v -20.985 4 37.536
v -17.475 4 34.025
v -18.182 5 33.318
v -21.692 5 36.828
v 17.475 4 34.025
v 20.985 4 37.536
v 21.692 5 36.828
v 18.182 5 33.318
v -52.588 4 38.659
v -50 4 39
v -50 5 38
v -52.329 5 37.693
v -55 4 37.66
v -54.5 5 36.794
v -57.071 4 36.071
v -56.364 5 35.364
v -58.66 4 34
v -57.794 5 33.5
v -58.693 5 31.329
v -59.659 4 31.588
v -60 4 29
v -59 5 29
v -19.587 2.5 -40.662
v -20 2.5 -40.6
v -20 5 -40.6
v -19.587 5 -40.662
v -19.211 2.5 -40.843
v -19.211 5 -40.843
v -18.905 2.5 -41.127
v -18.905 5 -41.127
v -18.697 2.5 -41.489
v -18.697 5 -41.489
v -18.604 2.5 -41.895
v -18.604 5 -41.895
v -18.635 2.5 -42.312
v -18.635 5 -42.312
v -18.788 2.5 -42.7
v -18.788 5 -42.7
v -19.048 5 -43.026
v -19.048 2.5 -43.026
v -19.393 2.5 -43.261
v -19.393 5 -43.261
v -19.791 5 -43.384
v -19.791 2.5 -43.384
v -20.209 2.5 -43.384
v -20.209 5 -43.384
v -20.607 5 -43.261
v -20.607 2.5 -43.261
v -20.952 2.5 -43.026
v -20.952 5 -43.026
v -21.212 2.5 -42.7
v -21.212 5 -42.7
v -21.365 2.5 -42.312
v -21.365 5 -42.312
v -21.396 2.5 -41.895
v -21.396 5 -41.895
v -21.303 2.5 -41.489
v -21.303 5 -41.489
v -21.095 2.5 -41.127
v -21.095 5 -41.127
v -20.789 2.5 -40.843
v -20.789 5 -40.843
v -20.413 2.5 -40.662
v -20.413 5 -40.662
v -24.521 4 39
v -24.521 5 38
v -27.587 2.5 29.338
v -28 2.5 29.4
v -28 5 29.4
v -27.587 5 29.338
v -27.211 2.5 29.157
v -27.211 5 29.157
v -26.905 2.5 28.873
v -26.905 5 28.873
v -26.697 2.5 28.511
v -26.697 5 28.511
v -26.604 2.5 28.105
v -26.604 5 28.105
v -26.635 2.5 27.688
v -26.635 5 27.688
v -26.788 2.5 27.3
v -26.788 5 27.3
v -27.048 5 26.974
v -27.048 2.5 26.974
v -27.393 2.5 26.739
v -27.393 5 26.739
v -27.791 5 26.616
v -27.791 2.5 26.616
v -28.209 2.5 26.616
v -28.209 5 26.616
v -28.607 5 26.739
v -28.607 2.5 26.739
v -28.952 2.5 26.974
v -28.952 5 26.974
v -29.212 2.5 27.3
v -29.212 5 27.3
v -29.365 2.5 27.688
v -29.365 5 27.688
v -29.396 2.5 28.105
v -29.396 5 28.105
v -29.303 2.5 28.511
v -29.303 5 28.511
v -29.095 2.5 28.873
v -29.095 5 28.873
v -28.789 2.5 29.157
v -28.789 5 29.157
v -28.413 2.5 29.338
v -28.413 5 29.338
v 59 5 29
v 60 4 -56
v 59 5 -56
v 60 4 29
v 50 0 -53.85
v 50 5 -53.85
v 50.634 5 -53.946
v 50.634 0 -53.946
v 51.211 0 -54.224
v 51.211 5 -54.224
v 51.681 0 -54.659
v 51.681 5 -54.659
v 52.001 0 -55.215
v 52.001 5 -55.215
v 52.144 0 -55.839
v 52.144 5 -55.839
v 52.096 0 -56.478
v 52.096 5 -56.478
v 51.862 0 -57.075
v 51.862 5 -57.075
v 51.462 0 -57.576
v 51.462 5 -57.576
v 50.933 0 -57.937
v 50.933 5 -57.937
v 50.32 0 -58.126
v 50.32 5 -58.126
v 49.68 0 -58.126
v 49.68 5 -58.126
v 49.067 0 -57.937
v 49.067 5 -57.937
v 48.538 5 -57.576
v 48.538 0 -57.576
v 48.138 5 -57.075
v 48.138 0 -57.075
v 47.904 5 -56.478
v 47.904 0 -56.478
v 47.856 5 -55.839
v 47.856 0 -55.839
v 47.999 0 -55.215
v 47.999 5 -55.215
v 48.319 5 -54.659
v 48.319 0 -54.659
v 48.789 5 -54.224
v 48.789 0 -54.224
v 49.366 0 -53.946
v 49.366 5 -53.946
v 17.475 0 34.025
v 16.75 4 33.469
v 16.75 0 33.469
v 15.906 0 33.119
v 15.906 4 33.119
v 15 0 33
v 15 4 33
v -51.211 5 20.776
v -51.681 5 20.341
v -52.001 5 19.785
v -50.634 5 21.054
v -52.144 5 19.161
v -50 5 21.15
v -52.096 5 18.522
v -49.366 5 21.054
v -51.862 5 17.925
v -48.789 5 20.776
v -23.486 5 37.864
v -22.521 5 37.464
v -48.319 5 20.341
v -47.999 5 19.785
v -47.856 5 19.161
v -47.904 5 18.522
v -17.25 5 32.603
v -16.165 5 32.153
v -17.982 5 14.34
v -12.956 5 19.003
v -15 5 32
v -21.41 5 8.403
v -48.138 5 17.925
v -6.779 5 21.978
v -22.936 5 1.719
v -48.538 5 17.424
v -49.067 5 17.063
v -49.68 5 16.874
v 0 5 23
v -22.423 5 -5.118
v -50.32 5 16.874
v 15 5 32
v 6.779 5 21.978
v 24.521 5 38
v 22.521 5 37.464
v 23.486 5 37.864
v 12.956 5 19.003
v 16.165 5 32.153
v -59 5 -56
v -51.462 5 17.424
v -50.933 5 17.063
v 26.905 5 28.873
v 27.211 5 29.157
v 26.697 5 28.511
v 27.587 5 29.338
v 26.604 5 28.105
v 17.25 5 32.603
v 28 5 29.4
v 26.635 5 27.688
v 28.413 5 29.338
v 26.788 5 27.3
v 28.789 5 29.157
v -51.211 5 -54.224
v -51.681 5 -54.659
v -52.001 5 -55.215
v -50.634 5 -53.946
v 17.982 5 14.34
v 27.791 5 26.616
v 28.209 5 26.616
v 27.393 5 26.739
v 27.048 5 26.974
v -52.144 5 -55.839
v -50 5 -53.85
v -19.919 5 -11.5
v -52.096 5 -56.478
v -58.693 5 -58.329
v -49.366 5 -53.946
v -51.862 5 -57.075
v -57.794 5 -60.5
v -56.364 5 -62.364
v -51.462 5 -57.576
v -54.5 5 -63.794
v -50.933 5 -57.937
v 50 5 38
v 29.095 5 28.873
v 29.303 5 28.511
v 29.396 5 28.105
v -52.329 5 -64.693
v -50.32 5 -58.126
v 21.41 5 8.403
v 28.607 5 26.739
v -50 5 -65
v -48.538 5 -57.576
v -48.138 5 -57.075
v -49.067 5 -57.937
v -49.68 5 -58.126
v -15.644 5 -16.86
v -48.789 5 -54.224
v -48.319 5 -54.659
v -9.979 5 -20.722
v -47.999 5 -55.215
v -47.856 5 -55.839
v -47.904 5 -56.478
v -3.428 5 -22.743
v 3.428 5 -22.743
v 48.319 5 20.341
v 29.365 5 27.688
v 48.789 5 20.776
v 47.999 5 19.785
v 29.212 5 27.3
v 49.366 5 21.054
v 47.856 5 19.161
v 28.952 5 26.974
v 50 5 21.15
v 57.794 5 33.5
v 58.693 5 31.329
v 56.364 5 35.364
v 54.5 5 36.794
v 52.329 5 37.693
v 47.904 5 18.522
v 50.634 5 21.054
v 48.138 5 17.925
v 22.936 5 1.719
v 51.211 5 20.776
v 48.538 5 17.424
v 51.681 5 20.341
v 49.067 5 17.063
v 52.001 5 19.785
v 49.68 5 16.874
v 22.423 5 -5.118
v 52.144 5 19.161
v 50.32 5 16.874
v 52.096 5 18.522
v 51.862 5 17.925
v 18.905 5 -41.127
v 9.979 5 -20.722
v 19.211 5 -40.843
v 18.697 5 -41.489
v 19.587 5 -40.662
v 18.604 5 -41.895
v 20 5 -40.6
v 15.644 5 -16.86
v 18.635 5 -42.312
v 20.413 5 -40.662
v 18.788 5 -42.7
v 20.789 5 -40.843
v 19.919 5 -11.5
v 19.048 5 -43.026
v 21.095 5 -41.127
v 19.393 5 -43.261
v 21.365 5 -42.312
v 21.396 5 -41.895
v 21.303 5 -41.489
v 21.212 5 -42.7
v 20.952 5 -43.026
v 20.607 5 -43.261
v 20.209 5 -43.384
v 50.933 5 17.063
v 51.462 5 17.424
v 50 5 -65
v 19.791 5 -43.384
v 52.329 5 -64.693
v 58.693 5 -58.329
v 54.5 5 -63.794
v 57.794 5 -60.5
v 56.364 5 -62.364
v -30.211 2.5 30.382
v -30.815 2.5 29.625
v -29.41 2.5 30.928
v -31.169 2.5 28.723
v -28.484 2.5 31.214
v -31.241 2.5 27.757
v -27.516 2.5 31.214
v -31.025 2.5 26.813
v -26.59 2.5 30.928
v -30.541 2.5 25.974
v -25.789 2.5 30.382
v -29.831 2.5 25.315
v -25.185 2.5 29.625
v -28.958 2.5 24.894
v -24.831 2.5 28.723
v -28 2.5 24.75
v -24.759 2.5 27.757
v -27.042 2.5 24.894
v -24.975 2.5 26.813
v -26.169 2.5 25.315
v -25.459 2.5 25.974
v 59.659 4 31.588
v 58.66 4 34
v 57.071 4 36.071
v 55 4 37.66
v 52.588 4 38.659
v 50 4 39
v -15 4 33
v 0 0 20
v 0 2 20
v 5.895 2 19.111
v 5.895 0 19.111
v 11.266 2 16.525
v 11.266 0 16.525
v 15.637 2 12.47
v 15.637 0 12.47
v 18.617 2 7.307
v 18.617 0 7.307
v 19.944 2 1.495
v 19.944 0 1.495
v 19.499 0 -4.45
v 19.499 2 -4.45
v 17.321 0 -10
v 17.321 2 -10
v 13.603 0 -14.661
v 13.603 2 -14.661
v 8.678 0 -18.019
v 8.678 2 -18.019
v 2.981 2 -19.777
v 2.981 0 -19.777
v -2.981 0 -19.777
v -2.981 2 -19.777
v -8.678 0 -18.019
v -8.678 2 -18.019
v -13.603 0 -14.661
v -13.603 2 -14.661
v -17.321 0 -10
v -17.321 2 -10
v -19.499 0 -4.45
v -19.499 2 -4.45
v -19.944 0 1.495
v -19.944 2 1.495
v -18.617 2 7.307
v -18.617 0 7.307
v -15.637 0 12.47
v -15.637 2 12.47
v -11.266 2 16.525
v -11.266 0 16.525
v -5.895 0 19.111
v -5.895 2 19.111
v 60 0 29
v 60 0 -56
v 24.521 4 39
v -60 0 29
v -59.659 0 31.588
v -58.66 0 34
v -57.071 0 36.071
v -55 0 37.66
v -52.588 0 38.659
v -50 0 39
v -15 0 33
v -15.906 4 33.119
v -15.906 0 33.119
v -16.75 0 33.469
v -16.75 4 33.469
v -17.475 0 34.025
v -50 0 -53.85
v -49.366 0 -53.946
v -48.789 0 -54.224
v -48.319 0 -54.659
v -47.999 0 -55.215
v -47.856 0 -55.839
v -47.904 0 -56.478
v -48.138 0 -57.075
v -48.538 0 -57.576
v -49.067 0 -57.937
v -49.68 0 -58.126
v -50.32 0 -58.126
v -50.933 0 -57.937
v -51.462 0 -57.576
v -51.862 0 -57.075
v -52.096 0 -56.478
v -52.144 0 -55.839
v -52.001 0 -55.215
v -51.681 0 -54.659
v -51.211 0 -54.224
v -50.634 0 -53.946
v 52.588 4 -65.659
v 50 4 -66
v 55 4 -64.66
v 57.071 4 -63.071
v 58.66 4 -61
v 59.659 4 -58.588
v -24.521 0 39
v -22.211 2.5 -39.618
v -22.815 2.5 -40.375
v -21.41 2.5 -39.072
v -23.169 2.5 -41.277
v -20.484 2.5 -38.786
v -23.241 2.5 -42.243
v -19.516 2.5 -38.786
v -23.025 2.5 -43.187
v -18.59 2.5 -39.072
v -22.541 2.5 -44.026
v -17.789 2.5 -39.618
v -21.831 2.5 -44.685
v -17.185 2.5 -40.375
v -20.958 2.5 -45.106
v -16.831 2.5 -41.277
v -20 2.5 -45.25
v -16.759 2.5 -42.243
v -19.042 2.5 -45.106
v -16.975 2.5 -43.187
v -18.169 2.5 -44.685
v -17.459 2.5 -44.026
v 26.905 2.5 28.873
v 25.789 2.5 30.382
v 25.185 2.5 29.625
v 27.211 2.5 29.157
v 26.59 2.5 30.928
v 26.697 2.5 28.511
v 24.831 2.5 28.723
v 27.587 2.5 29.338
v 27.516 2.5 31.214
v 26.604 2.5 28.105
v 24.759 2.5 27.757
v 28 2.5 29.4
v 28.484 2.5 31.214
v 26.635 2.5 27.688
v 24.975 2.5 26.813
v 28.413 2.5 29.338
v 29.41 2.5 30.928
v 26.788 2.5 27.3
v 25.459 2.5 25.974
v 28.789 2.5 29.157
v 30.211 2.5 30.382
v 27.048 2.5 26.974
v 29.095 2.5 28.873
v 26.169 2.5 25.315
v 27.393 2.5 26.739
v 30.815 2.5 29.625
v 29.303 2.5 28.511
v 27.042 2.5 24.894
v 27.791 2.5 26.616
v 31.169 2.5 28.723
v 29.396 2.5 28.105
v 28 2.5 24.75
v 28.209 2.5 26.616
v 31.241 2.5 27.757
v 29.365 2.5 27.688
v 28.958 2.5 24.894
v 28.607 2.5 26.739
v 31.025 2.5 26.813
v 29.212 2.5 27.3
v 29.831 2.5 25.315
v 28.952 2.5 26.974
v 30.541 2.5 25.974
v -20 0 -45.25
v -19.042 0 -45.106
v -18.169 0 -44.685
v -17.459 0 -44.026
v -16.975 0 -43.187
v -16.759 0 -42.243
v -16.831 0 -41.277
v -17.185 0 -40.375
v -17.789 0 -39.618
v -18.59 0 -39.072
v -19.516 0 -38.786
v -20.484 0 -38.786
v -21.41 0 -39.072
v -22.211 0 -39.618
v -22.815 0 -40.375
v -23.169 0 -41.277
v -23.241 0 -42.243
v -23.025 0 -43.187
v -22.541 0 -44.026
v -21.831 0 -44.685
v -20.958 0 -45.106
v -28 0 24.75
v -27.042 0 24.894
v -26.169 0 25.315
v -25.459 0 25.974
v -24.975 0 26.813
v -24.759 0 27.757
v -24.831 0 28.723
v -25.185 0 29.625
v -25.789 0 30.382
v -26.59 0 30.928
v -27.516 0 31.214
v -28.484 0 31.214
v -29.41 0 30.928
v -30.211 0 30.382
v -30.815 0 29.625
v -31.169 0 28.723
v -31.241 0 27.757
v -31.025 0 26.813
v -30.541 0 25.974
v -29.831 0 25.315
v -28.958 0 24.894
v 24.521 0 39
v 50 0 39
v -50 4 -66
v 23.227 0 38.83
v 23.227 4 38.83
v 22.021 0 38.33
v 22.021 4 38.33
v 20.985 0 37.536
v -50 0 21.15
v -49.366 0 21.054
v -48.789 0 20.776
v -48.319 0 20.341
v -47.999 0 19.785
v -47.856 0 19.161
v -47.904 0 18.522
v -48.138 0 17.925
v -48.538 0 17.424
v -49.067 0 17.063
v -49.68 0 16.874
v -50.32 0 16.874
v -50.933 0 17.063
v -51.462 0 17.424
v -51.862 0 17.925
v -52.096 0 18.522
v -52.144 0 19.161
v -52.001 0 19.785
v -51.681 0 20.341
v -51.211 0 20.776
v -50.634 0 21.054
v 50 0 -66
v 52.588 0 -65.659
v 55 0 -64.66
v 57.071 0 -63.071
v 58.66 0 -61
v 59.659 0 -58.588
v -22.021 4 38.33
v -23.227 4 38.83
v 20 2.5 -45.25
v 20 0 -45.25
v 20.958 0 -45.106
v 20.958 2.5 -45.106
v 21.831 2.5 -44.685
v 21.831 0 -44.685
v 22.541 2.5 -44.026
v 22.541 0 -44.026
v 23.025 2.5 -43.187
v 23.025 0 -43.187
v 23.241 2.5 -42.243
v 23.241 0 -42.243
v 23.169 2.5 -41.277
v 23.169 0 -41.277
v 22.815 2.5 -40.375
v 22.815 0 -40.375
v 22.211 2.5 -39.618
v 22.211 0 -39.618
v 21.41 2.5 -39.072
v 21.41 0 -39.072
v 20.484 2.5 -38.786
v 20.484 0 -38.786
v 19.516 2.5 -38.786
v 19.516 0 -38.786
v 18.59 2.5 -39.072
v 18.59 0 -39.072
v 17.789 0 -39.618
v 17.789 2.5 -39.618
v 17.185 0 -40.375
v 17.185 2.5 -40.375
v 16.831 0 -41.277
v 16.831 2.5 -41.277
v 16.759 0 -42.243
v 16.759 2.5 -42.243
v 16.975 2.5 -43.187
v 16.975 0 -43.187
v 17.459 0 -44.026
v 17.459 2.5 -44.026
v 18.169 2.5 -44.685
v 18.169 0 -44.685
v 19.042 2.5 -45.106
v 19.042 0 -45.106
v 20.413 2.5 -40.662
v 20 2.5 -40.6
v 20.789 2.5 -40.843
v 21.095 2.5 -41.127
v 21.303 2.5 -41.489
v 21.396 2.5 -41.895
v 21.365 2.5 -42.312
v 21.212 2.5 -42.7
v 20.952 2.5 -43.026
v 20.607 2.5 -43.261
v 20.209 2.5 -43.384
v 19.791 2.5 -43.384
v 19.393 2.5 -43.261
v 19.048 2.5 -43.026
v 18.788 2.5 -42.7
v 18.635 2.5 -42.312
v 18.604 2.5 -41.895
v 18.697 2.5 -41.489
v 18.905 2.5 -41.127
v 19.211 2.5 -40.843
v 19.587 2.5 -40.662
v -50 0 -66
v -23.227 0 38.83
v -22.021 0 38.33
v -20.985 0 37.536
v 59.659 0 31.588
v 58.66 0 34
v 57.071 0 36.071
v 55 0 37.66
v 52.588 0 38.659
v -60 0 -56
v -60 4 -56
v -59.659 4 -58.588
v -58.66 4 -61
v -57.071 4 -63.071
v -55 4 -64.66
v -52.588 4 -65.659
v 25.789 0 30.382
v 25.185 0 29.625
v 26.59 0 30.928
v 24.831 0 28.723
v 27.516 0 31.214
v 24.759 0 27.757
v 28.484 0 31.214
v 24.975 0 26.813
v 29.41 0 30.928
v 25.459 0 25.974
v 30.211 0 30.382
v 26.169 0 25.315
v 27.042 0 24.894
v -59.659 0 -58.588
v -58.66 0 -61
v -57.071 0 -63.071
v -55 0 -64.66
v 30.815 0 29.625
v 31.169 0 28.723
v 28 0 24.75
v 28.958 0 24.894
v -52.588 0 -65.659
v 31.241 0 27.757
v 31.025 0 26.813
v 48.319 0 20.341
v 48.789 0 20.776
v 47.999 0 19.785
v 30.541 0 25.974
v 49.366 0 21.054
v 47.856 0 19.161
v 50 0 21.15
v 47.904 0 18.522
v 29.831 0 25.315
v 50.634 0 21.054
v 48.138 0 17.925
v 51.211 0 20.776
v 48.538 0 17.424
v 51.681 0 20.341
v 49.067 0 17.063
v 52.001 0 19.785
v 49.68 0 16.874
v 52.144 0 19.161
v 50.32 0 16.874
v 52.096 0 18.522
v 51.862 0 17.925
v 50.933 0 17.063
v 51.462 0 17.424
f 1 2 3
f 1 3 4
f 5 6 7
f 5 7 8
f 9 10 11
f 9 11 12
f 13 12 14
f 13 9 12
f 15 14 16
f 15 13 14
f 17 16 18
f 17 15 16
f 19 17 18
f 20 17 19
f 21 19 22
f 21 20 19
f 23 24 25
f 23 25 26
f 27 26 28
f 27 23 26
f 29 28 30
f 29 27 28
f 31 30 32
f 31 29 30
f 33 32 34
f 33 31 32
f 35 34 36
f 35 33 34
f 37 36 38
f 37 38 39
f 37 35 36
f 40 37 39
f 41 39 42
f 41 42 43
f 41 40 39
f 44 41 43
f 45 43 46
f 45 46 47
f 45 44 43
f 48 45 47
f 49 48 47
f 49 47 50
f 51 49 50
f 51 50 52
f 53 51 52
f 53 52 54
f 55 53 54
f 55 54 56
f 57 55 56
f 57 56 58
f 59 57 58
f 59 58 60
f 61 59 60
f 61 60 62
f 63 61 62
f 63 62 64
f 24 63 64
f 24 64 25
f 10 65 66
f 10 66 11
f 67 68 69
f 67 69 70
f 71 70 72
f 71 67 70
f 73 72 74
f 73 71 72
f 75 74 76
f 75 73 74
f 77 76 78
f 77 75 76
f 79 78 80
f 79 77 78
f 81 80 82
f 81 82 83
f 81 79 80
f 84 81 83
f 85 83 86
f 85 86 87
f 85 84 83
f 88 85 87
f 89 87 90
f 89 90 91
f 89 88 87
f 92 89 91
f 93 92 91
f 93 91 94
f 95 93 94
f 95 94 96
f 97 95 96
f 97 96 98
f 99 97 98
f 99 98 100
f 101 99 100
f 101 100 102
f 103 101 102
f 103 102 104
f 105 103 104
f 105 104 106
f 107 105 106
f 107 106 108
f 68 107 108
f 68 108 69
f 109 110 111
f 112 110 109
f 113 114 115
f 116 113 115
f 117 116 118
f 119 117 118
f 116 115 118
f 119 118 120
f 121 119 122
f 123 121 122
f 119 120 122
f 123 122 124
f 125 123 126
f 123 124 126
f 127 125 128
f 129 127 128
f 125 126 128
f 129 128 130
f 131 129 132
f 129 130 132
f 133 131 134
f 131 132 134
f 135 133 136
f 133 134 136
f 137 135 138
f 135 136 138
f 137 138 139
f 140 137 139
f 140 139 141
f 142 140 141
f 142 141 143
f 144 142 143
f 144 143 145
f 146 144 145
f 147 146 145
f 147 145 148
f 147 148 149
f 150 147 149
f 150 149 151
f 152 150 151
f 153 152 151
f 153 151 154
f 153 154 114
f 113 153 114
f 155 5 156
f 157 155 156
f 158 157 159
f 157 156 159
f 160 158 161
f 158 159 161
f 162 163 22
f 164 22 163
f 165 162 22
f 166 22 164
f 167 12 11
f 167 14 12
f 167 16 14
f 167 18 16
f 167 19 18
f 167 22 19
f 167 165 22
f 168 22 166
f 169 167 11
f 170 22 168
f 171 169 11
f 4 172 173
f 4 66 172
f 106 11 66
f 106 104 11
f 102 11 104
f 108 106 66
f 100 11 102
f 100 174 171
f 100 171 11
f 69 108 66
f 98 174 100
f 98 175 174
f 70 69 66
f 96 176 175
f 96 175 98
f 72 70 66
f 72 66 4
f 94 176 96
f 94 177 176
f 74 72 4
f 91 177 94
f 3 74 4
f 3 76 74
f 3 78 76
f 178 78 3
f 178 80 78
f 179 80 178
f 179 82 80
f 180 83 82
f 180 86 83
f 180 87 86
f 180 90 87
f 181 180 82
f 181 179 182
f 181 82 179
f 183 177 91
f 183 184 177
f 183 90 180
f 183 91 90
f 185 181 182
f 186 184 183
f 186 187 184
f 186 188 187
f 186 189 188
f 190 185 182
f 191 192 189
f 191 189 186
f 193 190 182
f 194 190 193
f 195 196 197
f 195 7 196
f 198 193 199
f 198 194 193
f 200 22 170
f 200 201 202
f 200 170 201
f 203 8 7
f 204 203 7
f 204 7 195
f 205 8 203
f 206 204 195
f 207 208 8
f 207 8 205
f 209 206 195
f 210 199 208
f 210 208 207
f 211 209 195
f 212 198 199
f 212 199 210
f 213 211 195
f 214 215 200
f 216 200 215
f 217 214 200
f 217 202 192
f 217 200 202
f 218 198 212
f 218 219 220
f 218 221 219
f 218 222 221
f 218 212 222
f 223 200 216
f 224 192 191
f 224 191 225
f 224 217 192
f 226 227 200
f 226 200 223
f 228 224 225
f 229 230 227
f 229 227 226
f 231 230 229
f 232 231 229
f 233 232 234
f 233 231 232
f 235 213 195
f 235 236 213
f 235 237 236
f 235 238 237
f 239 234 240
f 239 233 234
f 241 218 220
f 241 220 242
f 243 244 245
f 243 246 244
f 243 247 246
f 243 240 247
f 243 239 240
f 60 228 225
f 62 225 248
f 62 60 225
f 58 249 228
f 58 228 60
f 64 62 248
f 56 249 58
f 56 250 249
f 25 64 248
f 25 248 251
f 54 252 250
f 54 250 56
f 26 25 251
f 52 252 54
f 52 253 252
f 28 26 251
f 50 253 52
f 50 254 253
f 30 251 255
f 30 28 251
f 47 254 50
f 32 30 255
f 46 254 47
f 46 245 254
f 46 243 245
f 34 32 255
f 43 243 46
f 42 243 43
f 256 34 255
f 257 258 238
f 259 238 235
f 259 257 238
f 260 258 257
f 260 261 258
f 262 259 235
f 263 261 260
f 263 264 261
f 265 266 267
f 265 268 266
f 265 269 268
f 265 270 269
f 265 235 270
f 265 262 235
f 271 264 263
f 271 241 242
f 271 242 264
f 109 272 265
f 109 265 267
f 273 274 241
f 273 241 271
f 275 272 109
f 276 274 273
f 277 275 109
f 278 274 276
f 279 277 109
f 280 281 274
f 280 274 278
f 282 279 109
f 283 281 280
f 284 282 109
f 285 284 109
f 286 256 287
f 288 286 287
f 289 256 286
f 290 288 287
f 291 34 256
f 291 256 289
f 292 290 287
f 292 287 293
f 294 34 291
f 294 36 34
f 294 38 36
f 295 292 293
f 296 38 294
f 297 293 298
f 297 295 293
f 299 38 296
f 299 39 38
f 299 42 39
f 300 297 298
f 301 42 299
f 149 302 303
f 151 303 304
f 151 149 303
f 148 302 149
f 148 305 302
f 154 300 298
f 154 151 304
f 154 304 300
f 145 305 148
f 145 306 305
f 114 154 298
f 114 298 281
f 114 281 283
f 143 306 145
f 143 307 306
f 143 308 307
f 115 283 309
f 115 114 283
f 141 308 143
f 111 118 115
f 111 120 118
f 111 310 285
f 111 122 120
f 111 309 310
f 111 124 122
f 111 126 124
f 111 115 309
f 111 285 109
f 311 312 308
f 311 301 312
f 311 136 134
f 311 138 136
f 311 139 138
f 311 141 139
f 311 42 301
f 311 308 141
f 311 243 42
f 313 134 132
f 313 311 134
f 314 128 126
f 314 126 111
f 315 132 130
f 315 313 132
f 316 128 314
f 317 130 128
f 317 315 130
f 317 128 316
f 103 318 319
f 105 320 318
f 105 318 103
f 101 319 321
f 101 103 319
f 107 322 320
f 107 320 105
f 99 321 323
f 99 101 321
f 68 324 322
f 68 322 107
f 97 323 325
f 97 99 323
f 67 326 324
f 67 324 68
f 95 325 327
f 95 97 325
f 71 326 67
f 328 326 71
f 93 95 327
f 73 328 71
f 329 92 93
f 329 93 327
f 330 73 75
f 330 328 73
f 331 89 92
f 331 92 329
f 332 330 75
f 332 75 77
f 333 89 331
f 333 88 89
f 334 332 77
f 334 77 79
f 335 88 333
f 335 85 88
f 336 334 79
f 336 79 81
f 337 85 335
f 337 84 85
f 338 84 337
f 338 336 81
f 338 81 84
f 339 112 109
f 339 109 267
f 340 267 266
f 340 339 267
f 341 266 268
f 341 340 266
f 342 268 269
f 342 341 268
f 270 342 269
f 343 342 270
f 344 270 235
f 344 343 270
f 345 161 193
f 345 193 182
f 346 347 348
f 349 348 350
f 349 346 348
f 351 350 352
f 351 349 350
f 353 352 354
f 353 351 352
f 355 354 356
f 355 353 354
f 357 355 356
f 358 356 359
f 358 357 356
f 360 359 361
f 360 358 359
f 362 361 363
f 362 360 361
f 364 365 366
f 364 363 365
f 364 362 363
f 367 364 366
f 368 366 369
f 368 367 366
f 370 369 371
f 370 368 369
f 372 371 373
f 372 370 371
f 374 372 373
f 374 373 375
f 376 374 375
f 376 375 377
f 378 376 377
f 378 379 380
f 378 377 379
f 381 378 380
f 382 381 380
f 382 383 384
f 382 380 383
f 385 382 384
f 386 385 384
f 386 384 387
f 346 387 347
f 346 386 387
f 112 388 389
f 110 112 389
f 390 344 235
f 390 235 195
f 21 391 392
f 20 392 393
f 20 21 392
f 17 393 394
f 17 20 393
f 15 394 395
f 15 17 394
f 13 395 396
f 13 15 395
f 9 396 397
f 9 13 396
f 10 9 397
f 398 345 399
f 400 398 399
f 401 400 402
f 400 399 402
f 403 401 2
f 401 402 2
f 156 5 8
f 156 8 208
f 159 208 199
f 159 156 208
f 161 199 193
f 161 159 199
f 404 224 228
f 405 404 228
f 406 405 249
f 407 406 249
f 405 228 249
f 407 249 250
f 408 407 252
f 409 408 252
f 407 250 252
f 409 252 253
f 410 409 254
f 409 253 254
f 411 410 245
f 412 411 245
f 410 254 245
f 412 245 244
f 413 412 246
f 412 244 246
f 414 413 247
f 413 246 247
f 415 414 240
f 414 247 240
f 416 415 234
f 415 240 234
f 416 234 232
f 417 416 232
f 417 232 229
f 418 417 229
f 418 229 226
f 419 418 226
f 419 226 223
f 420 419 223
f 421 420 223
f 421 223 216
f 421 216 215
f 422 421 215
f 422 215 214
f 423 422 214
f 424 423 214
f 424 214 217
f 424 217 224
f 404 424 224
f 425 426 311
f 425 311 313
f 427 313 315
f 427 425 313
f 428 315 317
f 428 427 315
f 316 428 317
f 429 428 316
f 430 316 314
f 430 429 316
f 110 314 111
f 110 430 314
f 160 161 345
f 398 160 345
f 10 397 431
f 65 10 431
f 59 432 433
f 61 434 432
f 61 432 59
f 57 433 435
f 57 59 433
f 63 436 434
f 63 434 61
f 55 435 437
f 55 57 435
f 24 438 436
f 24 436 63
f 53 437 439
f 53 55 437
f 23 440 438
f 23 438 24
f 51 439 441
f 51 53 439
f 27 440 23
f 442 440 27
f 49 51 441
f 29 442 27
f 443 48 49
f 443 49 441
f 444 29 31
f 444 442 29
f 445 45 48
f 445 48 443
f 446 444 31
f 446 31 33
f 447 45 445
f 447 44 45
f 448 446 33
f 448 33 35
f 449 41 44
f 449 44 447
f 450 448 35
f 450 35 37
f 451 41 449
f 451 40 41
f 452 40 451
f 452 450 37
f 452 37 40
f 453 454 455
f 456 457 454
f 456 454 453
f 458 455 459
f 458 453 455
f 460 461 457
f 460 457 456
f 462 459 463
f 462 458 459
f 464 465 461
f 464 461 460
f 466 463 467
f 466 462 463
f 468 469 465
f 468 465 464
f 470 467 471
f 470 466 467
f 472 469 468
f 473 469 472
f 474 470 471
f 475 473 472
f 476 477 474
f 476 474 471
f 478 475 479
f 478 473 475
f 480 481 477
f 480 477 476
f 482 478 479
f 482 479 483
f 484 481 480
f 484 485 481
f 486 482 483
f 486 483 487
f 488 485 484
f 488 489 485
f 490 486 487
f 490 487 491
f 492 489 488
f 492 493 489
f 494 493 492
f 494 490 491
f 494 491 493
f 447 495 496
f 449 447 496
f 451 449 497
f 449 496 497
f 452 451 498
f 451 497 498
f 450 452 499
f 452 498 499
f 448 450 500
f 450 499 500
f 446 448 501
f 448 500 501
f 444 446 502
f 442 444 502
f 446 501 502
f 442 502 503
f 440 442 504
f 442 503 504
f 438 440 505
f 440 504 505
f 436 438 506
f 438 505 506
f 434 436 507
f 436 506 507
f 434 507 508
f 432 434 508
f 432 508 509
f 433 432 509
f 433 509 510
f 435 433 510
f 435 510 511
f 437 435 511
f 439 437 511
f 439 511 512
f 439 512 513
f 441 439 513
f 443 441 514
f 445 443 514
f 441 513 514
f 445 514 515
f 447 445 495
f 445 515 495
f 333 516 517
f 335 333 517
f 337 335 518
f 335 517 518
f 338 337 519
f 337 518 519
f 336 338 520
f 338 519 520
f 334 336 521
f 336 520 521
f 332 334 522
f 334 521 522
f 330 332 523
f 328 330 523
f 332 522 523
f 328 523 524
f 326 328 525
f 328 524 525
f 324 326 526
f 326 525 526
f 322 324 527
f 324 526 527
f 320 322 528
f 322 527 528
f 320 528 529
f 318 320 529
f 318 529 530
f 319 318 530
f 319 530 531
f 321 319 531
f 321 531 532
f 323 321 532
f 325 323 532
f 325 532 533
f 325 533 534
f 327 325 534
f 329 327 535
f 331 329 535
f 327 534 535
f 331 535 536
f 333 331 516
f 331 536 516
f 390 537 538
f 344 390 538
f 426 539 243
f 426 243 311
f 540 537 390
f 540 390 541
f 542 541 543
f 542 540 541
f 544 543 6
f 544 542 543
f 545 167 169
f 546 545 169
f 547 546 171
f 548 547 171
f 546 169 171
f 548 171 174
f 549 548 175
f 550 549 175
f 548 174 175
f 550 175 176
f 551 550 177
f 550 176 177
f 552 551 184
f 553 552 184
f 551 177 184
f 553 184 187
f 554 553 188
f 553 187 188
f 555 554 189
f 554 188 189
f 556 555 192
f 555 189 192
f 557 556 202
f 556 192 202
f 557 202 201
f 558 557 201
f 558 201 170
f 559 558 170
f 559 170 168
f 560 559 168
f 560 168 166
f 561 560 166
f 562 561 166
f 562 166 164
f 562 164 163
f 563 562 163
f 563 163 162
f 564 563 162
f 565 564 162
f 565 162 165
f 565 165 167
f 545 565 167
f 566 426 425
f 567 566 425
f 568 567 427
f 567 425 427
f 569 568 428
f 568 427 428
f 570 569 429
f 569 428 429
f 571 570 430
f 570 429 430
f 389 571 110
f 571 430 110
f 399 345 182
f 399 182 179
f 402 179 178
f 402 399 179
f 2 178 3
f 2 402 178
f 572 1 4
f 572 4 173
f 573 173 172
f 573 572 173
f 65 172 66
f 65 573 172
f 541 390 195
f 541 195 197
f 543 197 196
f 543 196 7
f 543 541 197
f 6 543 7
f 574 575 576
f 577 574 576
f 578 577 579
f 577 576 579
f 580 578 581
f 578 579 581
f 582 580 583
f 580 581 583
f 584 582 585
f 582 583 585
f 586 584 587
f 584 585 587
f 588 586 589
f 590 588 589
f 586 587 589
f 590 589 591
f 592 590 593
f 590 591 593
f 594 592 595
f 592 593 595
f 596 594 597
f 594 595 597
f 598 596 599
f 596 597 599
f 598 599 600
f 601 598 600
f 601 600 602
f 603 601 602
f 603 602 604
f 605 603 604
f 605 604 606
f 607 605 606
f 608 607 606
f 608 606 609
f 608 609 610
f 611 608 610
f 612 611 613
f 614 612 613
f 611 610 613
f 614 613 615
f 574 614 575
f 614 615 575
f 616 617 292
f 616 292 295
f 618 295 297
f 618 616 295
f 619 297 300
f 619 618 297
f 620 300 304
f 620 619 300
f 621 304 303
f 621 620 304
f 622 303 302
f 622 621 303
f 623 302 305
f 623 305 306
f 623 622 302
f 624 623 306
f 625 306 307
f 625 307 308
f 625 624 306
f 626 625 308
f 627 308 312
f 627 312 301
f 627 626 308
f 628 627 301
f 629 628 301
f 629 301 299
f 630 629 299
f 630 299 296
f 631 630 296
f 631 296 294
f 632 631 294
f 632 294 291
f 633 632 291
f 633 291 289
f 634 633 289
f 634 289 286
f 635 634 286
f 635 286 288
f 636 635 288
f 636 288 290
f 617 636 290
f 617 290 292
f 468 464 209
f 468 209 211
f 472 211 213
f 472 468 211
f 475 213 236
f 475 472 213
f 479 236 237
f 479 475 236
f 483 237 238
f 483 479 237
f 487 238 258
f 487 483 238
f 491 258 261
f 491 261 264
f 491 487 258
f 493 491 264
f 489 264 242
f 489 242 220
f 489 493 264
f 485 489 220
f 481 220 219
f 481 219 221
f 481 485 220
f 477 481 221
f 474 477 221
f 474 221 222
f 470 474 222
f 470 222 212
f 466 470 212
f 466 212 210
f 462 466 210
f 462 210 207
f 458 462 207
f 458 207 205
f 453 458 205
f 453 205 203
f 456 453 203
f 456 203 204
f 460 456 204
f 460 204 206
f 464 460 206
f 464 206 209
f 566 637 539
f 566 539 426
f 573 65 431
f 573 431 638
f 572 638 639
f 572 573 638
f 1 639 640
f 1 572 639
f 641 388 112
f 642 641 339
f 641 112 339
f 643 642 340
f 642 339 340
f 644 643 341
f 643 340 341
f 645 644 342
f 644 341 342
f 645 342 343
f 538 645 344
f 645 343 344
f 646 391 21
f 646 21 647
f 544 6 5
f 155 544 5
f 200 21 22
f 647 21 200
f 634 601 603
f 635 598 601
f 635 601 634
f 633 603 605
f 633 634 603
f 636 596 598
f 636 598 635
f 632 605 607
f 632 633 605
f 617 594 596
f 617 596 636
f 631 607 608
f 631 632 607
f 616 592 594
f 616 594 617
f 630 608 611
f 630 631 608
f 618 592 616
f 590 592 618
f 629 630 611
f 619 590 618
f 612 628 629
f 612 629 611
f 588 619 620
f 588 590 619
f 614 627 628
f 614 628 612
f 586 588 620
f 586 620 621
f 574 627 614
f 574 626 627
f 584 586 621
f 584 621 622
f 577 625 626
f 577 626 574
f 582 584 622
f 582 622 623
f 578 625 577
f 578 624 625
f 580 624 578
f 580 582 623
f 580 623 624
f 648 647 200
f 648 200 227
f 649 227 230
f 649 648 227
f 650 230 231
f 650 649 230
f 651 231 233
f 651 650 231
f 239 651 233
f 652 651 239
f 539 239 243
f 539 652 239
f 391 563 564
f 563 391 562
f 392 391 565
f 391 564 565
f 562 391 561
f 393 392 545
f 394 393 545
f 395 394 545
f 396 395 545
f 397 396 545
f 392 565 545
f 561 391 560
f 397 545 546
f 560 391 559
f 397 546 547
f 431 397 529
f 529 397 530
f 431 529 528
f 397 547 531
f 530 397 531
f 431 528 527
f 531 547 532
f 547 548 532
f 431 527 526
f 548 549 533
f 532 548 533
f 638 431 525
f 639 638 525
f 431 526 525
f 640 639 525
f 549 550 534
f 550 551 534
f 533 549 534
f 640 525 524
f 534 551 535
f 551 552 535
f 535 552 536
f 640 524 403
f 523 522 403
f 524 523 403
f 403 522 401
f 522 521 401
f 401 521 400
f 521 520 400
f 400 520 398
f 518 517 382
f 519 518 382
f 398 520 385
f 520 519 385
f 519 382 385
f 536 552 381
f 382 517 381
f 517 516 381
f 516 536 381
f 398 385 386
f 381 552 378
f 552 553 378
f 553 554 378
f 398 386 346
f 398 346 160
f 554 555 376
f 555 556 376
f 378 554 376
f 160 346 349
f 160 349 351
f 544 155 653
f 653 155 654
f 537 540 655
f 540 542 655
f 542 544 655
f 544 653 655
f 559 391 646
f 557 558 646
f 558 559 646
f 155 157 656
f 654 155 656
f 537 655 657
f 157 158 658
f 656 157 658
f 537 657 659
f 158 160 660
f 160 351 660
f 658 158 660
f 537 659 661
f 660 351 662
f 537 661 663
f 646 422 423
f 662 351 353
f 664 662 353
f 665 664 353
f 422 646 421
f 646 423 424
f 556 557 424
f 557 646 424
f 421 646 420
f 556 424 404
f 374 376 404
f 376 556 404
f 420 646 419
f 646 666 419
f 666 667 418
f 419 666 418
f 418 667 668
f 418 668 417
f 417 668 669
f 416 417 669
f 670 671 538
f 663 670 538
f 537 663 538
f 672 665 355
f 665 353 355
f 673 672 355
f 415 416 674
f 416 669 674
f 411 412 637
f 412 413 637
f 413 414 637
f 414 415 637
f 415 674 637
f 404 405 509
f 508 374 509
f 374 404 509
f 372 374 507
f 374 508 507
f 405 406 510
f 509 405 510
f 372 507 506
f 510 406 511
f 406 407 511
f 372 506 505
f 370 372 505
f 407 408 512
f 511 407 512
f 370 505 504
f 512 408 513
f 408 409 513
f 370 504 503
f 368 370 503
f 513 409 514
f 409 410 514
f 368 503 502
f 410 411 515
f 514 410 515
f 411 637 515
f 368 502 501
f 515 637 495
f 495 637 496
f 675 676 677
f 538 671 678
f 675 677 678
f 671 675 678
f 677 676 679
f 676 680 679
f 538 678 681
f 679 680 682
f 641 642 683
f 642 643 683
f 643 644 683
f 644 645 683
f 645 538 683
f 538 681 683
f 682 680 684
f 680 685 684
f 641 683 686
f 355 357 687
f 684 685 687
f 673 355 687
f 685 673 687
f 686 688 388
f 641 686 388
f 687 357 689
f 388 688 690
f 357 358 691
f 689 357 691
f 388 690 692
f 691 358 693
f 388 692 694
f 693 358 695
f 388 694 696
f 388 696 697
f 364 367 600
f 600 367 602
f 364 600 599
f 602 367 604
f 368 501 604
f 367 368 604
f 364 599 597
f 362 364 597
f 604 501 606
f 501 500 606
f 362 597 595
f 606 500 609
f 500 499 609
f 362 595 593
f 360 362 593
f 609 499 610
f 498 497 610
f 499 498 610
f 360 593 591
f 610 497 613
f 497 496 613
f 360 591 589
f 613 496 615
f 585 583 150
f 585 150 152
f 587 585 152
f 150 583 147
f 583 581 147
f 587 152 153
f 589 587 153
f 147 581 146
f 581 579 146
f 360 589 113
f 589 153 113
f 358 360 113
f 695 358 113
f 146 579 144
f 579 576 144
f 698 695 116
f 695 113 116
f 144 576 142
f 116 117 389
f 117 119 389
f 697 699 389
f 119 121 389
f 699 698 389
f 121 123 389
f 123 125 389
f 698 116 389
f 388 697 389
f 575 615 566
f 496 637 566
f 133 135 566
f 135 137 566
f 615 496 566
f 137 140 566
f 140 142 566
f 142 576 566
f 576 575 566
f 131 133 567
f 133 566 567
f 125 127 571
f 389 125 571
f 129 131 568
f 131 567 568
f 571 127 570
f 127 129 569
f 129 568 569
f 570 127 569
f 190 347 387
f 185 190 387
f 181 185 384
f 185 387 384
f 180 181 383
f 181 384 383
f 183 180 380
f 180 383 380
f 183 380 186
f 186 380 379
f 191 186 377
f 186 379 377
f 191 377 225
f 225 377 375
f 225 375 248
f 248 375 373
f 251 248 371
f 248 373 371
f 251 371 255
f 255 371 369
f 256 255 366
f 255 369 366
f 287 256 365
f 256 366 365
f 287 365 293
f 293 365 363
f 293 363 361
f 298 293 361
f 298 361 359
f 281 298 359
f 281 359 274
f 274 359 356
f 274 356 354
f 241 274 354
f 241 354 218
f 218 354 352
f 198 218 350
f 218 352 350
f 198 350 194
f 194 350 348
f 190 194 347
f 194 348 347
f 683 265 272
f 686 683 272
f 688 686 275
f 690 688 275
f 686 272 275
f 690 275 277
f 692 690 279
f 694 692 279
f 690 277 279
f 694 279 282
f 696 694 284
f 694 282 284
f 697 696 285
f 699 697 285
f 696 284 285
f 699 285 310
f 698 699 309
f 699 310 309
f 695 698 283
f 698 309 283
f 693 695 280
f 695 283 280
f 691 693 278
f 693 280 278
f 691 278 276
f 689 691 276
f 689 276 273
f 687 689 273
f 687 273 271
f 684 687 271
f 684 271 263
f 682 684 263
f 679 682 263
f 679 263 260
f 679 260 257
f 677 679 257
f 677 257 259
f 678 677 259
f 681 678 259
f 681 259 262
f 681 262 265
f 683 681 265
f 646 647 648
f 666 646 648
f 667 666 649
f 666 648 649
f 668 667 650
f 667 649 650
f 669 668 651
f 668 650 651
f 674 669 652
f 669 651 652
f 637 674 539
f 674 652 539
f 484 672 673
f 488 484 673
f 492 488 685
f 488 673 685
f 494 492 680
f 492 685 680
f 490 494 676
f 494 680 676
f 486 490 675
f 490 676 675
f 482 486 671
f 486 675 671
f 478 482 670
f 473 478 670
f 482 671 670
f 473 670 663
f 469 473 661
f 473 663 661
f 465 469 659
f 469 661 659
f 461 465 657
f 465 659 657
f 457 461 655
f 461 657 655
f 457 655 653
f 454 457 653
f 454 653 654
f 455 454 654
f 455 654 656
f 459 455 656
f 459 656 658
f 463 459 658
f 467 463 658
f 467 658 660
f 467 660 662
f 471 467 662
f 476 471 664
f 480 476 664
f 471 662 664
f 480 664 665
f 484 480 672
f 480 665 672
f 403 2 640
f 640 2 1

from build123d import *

# Parameters (mm, degrees)
SKETCH2_W           = 120
SKETCH2_H           = 105
SKETCH2_R           = 1.4
BOSS_EXTRUDE2_DEPTH = 5
CUT_EXTRUDE7_DEPTH  = 90.336442732
FILLET5_R           = 10
SKETCH10_R          = 20
CUT_EXTRUDE9_DEPTH  = 90.336442732
CHAMFER3_SIZE       = 3
FILLET6_R           = 5
CHAMFER4_SIZE       = 1
SKETCH11_R          = 2.15
CUT_EXTRUDE10_DEPTH = 90.336442732
SKETCH13_R          = 3.25
CUT_EXTRUDE12_DEPTH = 2.5


with BuildPart() as part:
    # Sketch2 → Boss-Extrude2 (new body)
    with BuildSketch(Plane(origin=(0, 0, 0), x_dir=(1, 0, 0), z_dir=(0, 1, 0))):
        with Locations((0, 13.5)):
            Rectangle(SKETCH2_W, SKETCH2_H)
        with Locations(Location((-28, -28, 0), (0, 0, 270))):
            Circle(SKETCH2_R, mode=Mode.SUBTRACT)
        with Locations(Location((28, -28, 0), (0, 0, 270))):
            Circle(SKETCH2_R, mode=Mode.SUBTRACT)
        with Locations(Location((20, 42, 0), (0, 0, 270))):
            Circle(SKETCH2_R, mode=Mode.SUBTRACT)
        with Locations(Location((-20, 42, 0), (0, 0, 270))):
            Circle(SKETCH2_R, mode=Mode.SUBTRACT)
    extrude(amount=BOSS_EXTRUDE2_DEPTH)

    # Sketch9 → Cut-Extrude7 (cut, through all)
    with BuildSketch(Plane(origin=(0, 5, 0), x_dir=(1, 0, 0), z_dir=(0, 1, 0))):
        with BuildLine():
            Line((-17.474873734, -34.025126266), (-23.449747468, -40))
            Line((-23.449747468, -40), (23.449747468, -40))
            Line((23.449747468, -40), (17.474873734, -34.025126266))
            ThreePointArc((17.474873734, -34.025126266), (16.339392013, -33.266421636), (15, -33))
            Line((15, -33), (-15, -33))
            ThreePointArc((-15, -33), (-16.339392013, -33.266421636), (-17.474873734, -34.025126266))
        make_face()
    extrude(amount=-CUT_EXTRUDE7_DEPTH, mode=Mode.SUBTRACT)

    # Fillet5
    fillet5_edges = [part.edges().sort_by_distance(p)[0] for p in [
        (-60, 2.5, -66),
        (60, 2.5, -66),
        (60, 2.5, 39),
        (-60, 2.5, 39),
    ]]
    fillet(fillet5_edges, radius=FILLET5_R)

    # Sketch10 → Cut-Extrude9 (cut, through all)
    with BuildSketch(Plane(origin=(0, 0, 0), x_dir=(1, 0, 0), z_dir=(0, 1, 0))):
        with Locations(Location((0, 0, 0), (0, 0, 270))):
            Circle(SKETCH10_R)
    extrude(amount=CUT_EXTRUDE9_DEPTH, mode=Mode.SUBTRACT)

    # Chamfer3
    chamfer3_edges = [part.edges().sort_by_distance(p)[0] for p in [
        (0, 5, -20),
    ]]
    chamfer(chamfer3_edges, length=CHAMFER3_SIZE)

    # Fillet6
    fillet6_edges = [part.edges().sort_by_distance(p)[0] for p in [
        (-22.449747468, 2.5, 39),
        (22.449747468, 2.5, 39),
    ]]
    fillet(fillet6_edges, radius=FILLET6_R)

    # Chamfer4
    chamfer4_edges = [part.edges().sort_by_distance(p)[0] for p in [
        (16.339392013, 5, 33.266421636),
        (0, 5, 33),
        (-16.339392013, 5, 33.266421636),
        (-19.230077554, 5, 35.780330086),
        (-60, 5, -13.5),
        (0, 5, -66),
        (60, 5, -13.5),
        (-37.26040764, 5, 39),
        (-57.071067812, 5, 36.071067812),
        (57.071067812, 5, 36.071067812),
        (57.071067812, 5, -63.071067812),
        (-57.071067812, 5, -63.071067812),
        (19.230077554, 5, 35.780330086),
        (37.26040764, 5, 39),
        (22.607398118, 5, 38.619397663),
        (-22.607398118, 5, 38.619397663),
    ]]
    chamfer(chamfer4_edges, length=CHAMFER4_SIZE)

    # Sketch11 → Cut-Extrude10 (cut, through all)
    with BuildSketch(Plane(origin=(0, 5, 0), x_dir=(1, 0, 0), z_dir=(0, 1, 0))):
        with Locations(Location((-50, 56, 0), (0, 0, 270))):
            Circle(SKETCH11_R)
        with Locations(Location((50, 56, 0), (0, 0, 270))):
            Circle(SKETCH11_R)
        with Locations(Location((-50, -19, 0), (0, 0, 270))):
            Circle(SKETCH11_R)
        with Locations(Location((50, -19, 0), (0, 0, 270))):
            Circle(SKETCH11_R)
    extrude(amount=-CUT_EXTRUDE10_DEPTH, mode=Mode.SUBTRACT)

    # Sketch13 → Cut-Extrude12 (cut)
    with BuildSketch(Plane.XZ):
        with Locations(Location((-28, 28, 0), (0, 0, 270))):
            Circle(SKETCH13_R)
        with Locations(Location((28, 28, 0), (0, 0, 270))):
            Circle(SKETCH13_R)
        with Locations(Location((-20, -42, 0), (0, 0, 270))):
            Circle(SKETCH13_R)
        with Locations(Location((20, -42, 0), (0, 0, 270))):
            Circle(SKETCH13_R)
    extrude(amount=-CUT_EXTRUDE12_DEPTH, mode=Mode.SUBTRACT)


solid = part.part
